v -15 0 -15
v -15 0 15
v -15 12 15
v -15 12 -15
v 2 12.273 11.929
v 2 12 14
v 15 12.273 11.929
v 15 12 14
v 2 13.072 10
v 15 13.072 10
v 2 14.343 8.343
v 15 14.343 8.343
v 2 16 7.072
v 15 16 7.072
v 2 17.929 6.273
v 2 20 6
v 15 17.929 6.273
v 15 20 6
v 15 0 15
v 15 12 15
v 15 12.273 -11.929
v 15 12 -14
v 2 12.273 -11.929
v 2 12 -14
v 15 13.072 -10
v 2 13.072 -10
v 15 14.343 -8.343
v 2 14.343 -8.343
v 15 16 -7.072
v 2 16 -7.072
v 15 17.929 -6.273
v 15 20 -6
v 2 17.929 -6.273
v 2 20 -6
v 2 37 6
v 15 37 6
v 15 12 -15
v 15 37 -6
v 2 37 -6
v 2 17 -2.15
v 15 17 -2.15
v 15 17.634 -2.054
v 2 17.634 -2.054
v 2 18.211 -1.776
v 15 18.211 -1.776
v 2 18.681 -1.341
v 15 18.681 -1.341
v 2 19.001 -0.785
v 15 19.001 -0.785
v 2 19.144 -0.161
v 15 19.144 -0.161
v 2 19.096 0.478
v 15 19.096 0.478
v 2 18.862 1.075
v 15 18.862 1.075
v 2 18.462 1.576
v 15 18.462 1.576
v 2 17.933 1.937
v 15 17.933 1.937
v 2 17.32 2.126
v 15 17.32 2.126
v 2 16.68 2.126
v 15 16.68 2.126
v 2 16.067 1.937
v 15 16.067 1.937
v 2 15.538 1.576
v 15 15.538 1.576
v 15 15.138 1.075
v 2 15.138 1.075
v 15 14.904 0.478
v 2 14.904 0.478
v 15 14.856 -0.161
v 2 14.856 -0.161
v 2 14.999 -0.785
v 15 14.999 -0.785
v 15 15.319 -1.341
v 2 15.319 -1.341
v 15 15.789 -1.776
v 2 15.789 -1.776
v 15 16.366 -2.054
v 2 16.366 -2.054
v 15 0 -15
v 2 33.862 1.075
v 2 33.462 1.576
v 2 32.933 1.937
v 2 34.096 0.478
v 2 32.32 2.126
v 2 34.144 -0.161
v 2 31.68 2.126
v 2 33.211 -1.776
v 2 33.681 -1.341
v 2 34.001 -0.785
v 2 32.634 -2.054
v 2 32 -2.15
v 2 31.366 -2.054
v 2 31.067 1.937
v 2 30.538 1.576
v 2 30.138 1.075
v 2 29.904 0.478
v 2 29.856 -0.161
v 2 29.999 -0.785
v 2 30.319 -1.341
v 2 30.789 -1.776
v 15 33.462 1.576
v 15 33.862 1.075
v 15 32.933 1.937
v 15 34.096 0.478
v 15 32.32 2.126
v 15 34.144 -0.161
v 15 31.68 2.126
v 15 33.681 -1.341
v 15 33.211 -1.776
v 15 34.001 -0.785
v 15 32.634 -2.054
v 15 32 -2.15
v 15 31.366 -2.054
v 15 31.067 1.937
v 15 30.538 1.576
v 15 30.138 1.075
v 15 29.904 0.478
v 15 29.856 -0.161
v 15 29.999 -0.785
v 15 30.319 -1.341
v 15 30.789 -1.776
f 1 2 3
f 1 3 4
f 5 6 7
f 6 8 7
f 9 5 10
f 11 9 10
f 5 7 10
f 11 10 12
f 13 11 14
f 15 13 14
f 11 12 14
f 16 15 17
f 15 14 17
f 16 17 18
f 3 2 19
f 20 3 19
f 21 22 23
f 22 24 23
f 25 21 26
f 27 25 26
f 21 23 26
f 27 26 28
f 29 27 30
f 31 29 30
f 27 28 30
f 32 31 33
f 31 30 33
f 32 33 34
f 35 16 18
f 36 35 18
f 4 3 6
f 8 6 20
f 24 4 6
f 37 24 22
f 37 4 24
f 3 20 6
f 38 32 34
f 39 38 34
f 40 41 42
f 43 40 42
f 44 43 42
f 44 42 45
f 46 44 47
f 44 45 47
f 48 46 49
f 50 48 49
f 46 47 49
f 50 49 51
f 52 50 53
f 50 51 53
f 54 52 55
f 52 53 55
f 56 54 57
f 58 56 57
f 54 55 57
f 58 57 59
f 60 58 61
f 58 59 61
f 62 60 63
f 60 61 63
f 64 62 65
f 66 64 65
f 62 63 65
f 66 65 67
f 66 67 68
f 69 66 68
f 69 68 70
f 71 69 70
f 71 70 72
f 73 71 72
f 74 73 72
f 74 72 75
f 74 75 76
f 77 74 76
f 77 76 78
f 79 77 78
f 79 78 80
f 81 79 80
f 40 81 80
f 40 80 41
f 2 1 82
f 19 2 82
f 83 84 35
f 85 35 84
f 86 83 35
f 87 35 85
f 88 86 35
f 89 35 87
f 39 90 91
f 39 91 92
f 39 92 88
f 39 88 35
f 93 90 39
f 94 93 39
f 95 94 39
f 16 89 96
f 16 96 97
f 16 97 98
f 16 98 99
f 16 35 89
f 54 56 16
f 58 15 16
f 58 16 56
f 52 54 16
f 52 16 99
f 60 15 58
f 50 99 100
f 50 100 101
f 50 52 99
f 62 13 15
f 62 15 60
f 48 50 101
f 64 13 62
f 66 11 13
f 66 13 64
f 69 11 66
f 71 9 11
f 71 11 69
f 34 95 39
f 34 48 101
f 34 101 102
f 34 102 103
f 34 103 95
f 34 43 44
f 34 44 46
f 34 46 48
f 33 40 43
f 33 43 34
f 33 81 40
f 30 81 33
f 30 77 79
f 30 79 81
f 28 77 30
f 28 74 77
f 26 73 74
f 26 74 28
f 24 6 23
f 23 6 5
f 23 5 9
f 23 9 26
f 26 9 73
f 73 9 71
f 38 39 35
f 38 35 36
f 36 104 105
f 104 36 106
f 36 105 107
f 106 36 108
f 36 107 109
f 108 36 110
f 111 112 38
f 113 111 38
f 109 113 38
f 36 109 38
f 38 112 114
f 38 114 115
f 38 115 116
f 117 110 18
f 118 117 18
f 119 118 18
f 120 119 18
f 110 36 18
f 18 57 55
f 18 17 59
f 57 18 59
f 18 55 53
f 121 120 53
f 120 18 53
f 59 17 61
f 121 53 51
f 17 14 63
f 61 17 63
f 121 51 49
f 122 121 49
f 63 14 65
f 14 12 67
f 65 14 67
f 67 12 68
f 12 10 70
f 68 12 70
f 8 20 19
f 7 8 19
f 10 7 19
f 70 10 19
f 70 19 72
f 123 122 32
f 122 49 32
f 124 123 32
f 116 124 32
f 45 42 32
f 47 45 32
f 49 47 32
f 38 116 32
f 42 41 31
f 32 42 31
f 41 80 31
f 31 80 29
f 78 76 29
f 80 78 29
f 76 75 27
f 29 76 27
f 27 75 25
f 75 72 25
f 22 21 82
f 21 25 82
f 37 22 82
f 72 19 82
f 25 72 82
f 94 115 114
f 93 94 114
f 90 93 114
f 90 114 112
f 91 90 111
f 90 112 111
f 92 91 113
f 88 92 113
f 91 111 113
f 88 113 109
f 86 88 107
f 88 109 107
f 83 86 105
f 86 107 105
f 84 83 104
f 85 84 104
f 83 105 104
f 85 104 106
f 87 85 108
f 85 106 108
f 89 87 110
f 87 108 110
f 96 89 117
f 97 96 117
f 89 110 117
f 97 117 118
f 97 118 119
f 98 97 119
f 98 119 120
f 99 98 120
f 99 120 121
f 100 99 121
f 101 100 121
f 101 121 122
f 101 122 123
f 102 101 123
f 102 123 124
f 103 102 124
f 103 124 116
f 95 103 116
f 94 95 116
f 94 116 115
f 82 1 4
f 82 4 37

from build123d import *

# Parameters (mm, degrees)
SKETCH1_W           = 30
SKETCH1_H           = 30
BOSS_EXTRUDE1_DEPTH = 12
SKETCH2_W           = 5
SKETCH2_H           = 12
SKETCH2_W_2         = 8
BOSS_EXTRUDE2_DEPTH = 25
FILLET1_R           = 8
SKETCH3_R           = 2.15
CUT_EXTRUDE1_DEPTH  = 50.939963957


with BuildPart() as part:
    # Sketch1 → Boss-Extrude1 (new body)
    with BuildSketch(Plane(origin=(0, 0, 0), x_dir=(1, 0, 0), z_dir=(0, 1, 0))):
        Rectangle(SKETCH1_W, SKETCH1_H)
    extrude(amount=BOSS_EXTRUDE1_DEPTH)

    # Sketch2 → Boss-Extrude2 (add)
    with BuildSketch(Plane(origin=(0, 12, 0), x_dir=(1, 0, 0), z_dir=(0, 1, 0))):
        with Locations((12.5, 0)):
            Rectangle(SKETCH2_W, SKETCH2_H)
        with Locations((6, 0)):
            Rectangle(SKETCH2_W_2, SKETCH2_H)
    extrude(amount=BOSS_EXTRUDE2_DEPTH)

    # Fillet1
    fillet1_edges = [part.edges().sort_by_distance(p)[0] for p in [
        (8.5, 12, -6),
        (8.5, 12, 6),
    ]]
    fillet(fillet1_edges, radius=FILLET1_R)

    # Sketch3 → Cut-Extrude1 (cut, through all)
    with BuildSketch(Plane(origin=(15, 0, 0), x_dir=(0, 0, -1), z_dir=(1, 0, 0))):
        with Locations((0, 17)):
            Circle(SKETCH3_R)
        with Locations((0, 32)):
            Circle(SKETCH3_R)
    extrude(amount=-CUT_EXTRUDE1_DEPTH, mode=Mode.SUBTRACT)


solid = part.part
